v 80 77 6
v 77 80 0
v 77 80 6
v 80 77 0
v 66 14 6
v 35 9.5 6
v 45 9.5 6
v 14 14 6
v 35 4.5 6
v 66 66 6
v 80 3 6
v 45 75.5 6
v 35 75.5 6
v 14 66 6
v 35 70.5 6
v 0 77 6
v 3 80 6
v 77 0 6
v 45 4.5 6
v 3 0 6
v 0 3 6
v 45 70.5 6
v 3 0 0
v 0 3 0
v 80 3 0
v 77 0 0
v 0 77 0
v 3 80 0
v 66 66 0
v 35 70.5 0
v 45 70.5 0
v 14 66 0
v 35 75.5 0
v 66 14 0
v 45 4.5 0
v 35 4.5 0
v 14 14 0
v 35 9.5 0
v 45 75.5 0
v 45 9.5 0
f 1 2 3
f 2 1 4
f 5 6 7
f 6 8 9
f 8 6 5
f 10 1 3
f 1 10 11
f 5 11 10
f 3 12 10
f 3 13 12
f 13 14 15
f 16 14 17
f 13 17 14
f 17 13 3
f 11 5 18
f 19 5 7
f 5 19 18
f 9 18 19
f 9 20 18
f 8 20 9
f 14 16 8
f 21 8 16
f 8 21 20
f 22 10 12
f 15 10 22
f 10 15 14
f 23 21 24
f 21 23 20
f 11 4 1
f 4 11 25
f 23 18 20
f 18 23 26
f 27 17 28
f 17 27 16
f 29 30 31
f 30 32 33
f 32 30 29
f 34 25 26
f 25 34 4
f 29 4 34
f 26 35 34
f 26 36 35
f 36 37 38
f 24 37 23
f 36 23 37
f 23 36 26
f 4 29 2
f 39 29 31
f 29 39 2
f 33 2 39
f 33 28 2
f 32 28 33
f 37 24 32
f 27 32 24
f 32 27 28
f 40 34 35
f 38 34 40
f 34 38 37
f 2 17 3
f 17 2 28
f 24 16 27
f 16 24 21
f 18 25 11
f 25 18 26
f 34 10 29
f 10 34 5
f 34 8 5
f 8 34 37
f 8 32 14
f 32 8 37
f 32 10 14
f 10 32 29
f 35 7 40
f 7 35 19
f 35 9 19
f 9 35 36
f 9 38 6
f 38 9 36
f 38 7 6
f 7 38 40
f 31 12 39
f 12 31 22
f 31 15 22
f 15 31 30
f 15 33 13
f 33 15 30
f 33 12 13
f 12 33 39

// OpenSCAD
$fn = 32;

// ----------------------------------------------------------------------
// Frame plate: 80 x 80 frame, 14 mm rails
// ----------------------------------------------------------------------

// --- parameters (mm) ---
plate_l = 80;             // plate length, X
plate_w = 80;             // plate width, Y
plate_t = 6;              // plate thickness, Z (extrusion height)
corner_c = 3;             // corner chamfer
frame_bar = 14;           // frame rail width
slot_l = 10;              // adjustment slot length
slot_w = 5;               // adjustment slot width

win_l = plate_l - 2 * frame_bar;  // window length
win_w = plate_w - 2 * frame_bar;  // window width

profile = [[3, 0], [77, 0], [80, 3], [80, 77], [77, 80], [3, 80], [0, 77], [0, 3]];  // primary outline, 8 points, counter clockwise
void_1 = [[14, 14], [66, 14], [66, 66], [14, 66]];  // the window, 4 points
void_2 = [[35, 4.5], [45, 4.5], [45, 9.5], [35, 9.5]];  // adjustment slot, 4 points
void_3 = [[35, 70.5], [45, 70.5], [45, 75.5], [35, 75.5]];  // adjustment slot, 4 points

// --- the one profile operation ---
difference() {
  linear_extrude(height = plate_t) polygon(points = profile);
  translate([0, 0, -1])
    linear_extrude(height = plate_t + 2) polygon(points = void_1);
  translate([0, 0, -1])
    linear_extrude(height = plate_t + 2) polygon(points = void_2);
  translate([0, 0, -1])
    linear_extrude(height = plate_t + 2) polygon(points = void_3);
}
